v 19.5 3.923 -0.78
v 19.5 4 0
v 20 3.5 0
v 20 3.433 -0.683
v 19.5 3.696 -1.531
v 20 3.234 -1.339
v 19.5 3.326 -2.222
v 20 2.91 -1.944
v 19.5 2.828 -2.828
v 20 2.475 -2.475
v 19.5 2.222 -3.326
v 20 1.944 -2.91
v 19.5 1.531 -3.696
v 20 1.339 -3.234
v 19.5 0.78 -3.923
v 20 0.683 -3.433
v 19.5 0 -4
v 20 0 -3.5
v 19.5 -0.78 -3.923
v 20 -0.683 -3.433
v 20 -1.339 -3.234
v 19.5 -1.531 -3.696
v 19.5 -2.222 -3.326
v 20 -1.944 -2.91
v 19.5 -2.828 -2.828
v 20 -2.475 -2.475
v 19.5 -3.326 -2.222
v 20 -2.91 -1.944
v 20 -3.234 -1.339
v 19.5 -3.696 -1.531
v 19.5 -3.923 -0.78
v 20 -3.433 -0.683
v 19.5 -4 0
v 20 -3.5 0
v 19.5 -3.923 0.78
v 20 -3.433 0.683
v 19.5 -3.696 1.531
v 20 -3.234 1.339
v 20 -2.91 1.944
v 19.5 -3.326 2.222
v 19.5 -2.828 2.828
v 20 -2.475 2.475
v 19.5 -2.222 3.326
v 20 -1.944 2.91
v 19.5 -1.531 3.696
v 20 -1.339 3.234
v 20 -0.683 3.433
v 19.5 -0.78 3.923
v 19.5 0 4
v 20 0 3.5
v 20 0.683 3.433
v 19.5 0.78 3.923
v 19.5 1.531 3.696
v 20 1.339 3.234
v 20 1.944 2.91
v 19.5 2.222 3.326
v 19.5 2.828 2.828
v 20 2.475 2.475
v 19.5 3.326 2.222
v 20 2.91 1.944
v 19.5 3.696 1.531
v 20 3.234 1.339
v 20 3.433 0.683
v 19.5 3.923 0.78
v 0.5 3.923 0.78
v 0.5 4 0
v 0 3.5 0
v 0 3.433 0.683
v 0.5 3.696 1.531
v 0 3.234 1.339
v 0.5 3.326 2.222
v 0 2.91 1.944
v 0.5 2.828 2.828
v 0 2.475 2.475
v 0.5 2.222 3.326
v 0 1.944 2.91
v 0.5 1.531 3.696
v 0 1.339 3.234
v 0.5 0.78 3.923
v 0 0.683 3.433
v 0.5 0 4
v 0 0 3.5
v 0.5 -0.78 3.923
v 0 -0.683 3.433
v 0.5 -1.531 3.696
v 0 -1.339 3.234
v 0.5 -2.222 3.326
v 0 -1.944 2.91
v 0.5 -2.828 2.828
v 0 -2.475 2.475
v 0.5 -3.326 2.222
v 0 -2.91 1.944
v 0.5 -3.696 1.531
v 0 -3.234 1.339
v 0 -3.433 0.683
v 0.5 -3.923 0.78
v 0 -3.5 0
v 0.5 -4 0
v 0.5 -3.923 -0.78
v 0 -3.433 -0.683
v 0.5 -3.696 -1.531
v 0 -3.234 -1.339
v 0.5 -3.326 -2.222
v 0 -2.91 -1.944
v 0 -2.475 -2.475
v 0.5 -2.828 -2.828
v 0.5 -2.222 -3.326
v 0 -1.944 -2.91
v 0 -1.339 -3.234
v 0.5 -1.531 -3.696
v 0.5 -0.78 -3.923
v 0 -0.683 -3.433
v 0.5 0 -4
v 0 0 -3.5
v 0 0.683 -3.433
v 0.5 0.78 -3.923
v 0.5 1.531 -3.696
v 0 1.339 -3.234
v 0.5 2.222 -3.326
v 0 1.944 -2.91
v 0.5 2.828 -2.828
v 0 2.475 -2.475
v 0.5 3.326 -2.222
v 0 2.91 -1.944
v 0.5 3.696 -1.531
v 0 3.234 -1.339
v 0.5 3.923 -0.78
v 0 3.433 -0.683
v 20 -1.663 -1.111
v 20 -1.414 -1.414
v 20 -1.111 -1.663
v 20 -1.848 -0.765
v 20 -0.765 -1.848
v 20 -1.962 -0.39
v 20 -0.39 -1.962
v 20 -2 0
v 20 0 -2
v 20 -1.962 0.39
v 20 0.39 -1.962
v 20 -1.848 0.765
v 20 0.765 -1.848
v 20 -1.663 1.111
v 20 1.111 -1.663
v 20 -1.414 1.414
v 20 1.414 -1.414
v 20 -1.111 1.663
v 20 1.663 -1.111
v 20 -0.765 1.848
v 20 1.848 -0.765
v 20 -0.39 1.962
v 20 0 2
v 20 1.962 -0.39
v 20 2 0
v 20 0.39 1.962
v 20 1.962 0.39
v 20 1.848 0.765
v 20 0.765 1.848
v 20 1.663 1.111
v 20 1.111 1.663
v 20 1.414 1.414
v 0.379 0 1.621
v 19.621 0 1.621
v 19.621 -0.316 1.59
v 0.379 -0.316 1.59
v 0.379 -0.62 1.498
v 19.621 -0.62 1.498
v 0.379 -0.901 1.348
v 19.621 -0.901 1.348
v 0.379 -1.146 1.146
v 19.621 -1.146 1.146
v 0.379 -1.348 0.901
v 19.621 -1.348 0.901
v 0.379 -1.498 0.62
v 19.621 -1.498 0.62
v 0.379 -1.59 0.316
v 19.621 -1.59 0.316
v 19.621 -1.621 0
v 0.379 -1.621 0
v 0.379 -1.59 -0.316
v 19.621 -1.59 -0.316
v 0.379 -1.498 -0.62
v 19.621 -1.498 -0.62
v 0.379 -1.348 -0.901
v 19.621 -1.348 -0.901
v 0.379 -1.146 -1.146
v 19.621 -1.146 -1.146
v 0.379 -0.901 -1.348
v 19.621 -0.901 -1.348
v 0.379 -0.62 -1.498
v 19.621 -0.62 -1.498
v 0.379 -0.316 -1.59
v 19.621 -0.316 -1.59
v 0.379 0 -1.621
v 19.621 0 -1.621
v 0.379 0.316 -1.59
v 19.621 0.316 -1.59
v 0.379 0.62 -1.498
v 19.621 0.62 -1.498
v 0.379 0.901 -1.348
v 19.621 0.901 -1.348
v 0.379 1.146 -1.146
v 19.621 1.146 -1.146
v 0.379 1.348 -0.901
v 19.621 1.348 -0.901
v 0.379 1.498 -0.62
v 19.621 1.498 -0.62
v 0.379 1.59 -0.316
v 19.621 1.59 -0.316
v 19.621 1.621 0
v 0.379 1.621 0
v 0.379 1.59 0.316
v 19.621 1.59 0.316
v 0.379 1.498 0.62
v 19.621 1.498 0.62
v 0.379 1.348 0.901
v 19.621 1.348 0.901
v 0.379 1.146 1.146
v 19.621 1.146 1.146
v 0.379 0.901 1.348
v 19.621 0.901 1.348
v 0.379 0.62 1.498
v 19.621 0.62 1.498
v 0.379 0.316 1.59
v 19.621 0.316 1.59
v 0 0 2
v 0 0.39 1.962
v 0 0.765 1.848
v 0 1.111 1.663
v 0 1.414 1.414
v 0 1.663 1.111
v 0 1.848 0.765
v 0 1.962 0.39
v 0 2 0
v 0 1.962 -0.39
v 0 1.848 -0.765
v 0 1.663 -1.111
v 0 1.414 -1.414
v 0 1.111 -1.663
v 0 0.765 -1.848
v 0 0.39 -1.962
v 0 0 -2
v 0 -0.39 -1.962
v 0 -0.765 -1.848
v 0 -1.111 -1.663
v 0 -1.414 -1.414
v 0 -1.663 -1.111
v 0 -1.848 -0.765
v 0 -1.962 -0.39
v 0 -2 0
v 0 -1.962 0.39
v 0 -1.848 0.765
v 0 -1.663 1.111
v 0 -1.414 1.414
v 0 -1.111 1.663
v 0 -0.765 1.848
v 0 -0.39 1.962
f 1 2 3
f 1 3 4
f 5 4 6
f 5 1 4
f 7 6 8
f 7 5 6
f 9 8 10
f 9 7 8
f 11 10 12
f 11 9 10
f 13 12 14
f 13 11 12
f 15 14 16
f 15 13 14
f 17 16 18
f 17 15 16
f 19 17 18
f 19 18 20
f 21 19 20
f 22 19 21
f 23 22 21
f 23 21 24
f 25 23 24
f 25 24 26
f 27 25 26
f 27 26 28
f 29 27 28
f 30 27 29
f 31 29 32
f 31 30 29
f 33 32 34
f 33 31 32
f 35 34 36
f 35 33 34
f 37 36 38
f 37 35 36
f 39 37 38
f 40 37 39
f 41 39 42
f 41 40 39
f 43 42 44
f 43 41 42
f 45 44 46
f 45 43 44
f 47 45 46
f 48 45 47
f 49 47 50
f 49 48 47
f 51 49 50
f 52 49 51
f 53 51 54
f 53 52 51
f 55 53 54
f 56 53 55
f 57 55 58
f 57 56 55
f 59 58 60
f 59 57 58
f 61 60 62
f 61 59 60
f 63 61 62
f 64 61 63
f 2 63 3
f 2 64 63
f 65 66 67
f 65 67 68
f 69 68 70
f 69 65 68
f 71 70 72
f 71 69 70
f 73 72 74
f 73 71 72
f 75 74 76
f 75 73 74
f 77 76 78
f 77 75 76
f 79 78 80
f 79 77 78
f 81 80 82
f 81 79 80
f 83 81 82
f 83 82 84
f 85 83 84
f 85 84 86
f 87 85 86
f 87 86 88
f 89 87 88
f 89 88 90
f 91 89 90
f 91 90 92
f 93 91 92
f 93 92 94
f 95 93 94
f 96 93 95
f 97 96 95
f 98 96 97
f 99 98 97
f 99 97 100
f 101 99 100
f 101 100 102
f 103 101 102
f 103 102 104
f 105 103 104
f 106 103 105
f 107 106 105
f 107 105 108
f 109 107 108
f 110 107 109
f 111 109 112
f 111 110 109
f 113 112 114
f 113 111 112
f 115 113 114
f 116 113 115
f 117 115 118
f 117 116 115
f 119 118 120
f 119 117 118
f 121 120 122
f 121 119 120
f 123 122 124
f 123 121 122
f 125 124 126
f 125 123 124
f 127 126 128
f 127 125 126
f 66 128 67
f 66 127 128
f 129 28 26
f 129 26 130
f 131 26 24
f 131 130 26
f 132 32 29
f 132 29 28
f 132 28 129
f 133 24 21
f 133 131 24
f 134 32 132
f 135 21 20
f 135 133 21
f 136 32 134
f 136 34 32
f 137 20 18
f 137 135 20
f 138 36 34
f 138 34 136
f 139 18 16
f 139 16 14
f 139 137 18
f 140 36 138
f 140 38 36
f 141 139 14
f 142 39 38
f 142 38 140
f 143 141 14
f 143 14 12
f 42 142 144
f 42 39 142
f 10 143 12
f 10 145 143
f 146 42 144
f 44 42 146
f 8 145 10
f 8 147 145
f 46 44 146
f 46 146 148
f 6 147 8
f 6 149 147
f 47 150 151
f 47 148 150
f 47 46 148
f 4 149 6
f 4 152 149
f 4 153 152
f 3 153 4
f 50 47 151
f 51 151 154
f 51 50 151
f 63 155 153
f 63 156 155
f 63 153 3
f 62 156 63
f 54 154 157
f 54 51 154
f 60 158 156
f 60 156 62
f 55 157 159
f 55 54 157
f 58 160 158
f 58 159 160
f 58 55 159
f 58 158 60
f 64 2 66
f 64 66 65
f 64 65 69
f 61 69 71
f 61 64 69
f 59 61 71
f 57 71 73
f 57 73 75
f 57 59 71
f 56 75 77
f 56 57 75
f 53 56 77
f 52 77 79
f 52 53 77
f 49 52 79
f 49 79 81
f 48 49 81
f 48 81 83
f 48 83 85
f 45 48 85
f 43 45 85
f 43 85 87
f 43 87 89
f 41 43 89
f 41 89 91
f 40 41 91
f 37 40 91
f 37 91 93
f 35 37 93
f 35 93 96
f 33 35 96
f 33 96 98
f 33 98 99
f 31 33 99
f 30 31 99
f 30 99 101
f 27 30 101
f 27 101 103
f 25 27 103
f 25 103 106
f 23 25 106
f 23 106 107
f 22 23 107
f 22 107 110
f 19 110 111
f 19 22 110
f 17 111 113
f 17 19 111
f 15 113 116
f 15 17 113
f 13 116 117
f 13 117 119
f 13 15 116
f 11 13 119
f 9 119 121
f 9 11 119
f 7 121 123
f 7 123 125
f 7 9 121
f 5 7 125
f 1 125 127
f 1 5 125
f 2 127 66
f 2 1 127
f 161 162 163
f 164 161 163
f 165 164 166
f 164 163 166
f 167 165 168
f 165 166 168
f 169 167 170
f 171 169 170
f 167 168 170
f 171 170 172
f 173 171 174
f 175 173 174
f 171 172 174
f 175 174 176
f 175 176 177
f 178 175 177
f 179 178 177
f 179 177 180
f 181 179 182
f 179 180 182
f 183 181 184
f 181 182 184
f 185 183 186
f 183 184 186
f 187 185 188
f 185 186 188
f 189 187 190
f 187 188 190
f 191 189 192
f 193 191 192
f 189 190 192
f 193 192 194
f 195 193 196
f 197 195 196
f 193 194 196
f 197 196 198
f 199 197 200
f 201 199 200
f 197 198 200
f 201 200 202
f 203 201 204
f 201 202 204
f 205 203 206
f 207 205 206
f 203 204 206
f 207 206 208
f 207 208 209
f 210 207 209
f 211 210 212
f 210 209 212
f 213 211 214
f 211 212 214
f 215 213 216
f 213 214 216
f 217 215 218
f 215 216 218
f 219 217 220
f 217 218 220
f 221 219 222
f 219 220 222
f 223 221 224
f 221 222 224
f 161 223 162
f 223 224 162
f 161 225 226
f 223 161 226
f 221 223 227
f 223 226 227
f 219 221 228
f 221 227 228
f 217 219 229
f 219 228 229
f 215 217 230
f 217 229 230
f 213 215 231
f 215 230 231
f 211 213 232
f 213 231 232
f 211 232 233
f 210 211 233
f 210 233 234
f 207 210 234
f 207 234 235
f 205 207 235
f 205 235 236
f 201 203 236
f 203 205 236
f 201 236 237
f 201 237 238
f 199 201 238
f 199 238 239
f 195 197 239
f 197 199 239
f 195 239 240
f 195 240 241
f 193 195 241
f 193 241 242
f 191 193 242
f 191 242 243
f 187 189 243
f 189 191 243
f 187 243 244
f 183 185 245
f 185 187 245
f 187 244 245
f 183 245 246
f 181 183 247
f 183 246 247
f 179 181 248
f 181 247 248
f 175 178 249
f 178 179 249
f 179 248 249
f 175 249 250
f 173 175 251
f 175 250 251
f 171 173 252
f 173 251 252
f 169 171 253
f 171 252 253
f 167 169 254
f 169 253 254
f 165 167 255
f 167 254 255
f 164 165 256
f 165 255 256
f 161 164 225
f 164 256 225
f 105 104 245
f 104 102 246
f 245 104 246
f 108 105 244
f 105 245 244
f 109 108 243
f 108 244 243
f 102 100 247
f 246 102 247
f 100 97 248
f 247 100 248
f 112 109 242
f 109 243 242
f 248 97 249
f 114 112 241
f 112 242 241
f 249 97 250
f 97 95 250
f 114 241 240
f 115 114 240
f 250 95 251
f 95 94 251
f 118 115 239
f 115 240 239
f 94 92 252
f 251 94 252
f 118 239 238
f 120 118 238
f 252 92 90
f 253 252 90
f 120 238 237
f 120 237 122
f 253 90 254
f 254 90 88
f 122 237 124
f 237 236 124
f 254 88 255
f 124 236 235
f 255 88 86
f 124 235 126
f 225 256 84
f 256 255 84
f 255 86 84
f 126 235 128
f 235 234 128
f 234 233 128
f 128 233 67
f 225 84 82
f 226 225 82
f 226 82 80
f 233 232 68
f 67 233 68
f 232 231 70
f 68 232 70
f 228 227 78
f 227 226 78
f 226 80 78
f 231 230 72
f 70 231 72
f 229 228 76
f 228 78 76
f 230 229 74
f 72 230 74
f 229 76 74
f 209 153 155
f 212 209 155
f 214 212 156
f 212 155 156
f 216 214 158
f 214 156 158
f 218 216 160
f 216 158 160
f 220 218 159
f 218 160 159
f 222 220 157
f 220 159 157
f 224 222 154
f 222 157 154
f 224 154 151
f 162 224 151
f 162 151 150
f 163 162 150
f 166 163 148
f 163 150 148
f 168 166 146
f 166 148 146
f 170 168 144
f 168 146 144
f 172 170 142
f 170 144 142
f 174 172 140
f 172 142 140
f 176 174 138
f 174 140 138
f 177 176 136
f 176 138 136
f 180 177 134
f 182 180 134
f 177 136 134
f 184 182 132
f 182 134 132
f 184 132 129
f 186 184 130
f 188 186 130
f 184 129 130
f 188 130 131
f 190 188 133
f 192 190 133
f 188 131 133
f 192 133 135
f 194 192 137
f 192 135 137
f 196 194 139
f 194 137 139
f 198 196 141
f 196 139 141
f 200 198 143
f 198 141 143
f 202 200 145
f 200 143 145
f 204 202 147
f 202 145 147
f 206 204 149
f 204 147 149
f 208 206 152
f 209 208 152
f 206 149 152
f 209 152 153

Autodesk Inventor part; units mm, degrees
ref_plane "YZ Plane" through (0, 0, 0) normal (1, 0, 0) x (0, 1, 0)
ref_plane "XZ Plane" through (0, 0, 0) normal (0, 1, 0) x (-1, 0, 0)
ref_plane "XY Plane" through (0, 0, 0) normal (0, 0, 1) x (1, 0, 0)
sketch "Sketch_1" plane through (0, 0, 0) normal (0, 0, 1) x (1, 0, 0)
  line L0 (20, 0) -> (0, 0)
  line L1 (0, 0) -> (0, 3.5)
  line L2 (0, 3.5) -> (0.5, 4)
  line L3 (0.5, 4) -> (19.5, 4)
  line L4 (19.5, 4) -> (20, 3.5)
  line L5 (20, 3.5) -> (20, 0)
  line L6 (20, 0) -> (0, 0)
revolve "Revolution1" add sketch "Sketch_1" angle 360 about axis through (20, 0, 0) along (1, 0, 0)
sketch "Sketch2" plane through (0, 0, 0) normal (-1, 0, 0) x (0, 0, 1)
  point P0 (0, 0)
hole "Hole1" at (0, 0, 0) direction (1, 0, 0) diameter 3.242 depth 29.0641 tip angle 120 countersink diameter 4 countersink angle 90 thread size "M4x0.7" class "6H" standard "ISO Metric profile"
sketch "_____16" plane through (0, 0, 0) normal (0, 0, 1) x (1, 0, 0)
  line L0 (20, 0) -> (-10, 0)
  line L1 (-10, 0) -> (-9.0641, 1.621)
  line L2 (-9.0641, 1.621) -> (19.621, 1.621)
  line L3 (19.621, 1.621) -> (20, 2)
  line L4 (20, 2) -> (20, 0)
  line L5 (20, 0) -> (-10, 0)
revolve "Revolution2" cut sketch "_____16" angle 360 about axis through (20, 0, 0) along (1, 0, 0)
thread "Thread1" size "M4x0.7" class "6H" standard "ISO Metric profile" length 7.621
properties part number "SFHRW8-20-M4-N4_s" material "鋼、炭素鋼"
